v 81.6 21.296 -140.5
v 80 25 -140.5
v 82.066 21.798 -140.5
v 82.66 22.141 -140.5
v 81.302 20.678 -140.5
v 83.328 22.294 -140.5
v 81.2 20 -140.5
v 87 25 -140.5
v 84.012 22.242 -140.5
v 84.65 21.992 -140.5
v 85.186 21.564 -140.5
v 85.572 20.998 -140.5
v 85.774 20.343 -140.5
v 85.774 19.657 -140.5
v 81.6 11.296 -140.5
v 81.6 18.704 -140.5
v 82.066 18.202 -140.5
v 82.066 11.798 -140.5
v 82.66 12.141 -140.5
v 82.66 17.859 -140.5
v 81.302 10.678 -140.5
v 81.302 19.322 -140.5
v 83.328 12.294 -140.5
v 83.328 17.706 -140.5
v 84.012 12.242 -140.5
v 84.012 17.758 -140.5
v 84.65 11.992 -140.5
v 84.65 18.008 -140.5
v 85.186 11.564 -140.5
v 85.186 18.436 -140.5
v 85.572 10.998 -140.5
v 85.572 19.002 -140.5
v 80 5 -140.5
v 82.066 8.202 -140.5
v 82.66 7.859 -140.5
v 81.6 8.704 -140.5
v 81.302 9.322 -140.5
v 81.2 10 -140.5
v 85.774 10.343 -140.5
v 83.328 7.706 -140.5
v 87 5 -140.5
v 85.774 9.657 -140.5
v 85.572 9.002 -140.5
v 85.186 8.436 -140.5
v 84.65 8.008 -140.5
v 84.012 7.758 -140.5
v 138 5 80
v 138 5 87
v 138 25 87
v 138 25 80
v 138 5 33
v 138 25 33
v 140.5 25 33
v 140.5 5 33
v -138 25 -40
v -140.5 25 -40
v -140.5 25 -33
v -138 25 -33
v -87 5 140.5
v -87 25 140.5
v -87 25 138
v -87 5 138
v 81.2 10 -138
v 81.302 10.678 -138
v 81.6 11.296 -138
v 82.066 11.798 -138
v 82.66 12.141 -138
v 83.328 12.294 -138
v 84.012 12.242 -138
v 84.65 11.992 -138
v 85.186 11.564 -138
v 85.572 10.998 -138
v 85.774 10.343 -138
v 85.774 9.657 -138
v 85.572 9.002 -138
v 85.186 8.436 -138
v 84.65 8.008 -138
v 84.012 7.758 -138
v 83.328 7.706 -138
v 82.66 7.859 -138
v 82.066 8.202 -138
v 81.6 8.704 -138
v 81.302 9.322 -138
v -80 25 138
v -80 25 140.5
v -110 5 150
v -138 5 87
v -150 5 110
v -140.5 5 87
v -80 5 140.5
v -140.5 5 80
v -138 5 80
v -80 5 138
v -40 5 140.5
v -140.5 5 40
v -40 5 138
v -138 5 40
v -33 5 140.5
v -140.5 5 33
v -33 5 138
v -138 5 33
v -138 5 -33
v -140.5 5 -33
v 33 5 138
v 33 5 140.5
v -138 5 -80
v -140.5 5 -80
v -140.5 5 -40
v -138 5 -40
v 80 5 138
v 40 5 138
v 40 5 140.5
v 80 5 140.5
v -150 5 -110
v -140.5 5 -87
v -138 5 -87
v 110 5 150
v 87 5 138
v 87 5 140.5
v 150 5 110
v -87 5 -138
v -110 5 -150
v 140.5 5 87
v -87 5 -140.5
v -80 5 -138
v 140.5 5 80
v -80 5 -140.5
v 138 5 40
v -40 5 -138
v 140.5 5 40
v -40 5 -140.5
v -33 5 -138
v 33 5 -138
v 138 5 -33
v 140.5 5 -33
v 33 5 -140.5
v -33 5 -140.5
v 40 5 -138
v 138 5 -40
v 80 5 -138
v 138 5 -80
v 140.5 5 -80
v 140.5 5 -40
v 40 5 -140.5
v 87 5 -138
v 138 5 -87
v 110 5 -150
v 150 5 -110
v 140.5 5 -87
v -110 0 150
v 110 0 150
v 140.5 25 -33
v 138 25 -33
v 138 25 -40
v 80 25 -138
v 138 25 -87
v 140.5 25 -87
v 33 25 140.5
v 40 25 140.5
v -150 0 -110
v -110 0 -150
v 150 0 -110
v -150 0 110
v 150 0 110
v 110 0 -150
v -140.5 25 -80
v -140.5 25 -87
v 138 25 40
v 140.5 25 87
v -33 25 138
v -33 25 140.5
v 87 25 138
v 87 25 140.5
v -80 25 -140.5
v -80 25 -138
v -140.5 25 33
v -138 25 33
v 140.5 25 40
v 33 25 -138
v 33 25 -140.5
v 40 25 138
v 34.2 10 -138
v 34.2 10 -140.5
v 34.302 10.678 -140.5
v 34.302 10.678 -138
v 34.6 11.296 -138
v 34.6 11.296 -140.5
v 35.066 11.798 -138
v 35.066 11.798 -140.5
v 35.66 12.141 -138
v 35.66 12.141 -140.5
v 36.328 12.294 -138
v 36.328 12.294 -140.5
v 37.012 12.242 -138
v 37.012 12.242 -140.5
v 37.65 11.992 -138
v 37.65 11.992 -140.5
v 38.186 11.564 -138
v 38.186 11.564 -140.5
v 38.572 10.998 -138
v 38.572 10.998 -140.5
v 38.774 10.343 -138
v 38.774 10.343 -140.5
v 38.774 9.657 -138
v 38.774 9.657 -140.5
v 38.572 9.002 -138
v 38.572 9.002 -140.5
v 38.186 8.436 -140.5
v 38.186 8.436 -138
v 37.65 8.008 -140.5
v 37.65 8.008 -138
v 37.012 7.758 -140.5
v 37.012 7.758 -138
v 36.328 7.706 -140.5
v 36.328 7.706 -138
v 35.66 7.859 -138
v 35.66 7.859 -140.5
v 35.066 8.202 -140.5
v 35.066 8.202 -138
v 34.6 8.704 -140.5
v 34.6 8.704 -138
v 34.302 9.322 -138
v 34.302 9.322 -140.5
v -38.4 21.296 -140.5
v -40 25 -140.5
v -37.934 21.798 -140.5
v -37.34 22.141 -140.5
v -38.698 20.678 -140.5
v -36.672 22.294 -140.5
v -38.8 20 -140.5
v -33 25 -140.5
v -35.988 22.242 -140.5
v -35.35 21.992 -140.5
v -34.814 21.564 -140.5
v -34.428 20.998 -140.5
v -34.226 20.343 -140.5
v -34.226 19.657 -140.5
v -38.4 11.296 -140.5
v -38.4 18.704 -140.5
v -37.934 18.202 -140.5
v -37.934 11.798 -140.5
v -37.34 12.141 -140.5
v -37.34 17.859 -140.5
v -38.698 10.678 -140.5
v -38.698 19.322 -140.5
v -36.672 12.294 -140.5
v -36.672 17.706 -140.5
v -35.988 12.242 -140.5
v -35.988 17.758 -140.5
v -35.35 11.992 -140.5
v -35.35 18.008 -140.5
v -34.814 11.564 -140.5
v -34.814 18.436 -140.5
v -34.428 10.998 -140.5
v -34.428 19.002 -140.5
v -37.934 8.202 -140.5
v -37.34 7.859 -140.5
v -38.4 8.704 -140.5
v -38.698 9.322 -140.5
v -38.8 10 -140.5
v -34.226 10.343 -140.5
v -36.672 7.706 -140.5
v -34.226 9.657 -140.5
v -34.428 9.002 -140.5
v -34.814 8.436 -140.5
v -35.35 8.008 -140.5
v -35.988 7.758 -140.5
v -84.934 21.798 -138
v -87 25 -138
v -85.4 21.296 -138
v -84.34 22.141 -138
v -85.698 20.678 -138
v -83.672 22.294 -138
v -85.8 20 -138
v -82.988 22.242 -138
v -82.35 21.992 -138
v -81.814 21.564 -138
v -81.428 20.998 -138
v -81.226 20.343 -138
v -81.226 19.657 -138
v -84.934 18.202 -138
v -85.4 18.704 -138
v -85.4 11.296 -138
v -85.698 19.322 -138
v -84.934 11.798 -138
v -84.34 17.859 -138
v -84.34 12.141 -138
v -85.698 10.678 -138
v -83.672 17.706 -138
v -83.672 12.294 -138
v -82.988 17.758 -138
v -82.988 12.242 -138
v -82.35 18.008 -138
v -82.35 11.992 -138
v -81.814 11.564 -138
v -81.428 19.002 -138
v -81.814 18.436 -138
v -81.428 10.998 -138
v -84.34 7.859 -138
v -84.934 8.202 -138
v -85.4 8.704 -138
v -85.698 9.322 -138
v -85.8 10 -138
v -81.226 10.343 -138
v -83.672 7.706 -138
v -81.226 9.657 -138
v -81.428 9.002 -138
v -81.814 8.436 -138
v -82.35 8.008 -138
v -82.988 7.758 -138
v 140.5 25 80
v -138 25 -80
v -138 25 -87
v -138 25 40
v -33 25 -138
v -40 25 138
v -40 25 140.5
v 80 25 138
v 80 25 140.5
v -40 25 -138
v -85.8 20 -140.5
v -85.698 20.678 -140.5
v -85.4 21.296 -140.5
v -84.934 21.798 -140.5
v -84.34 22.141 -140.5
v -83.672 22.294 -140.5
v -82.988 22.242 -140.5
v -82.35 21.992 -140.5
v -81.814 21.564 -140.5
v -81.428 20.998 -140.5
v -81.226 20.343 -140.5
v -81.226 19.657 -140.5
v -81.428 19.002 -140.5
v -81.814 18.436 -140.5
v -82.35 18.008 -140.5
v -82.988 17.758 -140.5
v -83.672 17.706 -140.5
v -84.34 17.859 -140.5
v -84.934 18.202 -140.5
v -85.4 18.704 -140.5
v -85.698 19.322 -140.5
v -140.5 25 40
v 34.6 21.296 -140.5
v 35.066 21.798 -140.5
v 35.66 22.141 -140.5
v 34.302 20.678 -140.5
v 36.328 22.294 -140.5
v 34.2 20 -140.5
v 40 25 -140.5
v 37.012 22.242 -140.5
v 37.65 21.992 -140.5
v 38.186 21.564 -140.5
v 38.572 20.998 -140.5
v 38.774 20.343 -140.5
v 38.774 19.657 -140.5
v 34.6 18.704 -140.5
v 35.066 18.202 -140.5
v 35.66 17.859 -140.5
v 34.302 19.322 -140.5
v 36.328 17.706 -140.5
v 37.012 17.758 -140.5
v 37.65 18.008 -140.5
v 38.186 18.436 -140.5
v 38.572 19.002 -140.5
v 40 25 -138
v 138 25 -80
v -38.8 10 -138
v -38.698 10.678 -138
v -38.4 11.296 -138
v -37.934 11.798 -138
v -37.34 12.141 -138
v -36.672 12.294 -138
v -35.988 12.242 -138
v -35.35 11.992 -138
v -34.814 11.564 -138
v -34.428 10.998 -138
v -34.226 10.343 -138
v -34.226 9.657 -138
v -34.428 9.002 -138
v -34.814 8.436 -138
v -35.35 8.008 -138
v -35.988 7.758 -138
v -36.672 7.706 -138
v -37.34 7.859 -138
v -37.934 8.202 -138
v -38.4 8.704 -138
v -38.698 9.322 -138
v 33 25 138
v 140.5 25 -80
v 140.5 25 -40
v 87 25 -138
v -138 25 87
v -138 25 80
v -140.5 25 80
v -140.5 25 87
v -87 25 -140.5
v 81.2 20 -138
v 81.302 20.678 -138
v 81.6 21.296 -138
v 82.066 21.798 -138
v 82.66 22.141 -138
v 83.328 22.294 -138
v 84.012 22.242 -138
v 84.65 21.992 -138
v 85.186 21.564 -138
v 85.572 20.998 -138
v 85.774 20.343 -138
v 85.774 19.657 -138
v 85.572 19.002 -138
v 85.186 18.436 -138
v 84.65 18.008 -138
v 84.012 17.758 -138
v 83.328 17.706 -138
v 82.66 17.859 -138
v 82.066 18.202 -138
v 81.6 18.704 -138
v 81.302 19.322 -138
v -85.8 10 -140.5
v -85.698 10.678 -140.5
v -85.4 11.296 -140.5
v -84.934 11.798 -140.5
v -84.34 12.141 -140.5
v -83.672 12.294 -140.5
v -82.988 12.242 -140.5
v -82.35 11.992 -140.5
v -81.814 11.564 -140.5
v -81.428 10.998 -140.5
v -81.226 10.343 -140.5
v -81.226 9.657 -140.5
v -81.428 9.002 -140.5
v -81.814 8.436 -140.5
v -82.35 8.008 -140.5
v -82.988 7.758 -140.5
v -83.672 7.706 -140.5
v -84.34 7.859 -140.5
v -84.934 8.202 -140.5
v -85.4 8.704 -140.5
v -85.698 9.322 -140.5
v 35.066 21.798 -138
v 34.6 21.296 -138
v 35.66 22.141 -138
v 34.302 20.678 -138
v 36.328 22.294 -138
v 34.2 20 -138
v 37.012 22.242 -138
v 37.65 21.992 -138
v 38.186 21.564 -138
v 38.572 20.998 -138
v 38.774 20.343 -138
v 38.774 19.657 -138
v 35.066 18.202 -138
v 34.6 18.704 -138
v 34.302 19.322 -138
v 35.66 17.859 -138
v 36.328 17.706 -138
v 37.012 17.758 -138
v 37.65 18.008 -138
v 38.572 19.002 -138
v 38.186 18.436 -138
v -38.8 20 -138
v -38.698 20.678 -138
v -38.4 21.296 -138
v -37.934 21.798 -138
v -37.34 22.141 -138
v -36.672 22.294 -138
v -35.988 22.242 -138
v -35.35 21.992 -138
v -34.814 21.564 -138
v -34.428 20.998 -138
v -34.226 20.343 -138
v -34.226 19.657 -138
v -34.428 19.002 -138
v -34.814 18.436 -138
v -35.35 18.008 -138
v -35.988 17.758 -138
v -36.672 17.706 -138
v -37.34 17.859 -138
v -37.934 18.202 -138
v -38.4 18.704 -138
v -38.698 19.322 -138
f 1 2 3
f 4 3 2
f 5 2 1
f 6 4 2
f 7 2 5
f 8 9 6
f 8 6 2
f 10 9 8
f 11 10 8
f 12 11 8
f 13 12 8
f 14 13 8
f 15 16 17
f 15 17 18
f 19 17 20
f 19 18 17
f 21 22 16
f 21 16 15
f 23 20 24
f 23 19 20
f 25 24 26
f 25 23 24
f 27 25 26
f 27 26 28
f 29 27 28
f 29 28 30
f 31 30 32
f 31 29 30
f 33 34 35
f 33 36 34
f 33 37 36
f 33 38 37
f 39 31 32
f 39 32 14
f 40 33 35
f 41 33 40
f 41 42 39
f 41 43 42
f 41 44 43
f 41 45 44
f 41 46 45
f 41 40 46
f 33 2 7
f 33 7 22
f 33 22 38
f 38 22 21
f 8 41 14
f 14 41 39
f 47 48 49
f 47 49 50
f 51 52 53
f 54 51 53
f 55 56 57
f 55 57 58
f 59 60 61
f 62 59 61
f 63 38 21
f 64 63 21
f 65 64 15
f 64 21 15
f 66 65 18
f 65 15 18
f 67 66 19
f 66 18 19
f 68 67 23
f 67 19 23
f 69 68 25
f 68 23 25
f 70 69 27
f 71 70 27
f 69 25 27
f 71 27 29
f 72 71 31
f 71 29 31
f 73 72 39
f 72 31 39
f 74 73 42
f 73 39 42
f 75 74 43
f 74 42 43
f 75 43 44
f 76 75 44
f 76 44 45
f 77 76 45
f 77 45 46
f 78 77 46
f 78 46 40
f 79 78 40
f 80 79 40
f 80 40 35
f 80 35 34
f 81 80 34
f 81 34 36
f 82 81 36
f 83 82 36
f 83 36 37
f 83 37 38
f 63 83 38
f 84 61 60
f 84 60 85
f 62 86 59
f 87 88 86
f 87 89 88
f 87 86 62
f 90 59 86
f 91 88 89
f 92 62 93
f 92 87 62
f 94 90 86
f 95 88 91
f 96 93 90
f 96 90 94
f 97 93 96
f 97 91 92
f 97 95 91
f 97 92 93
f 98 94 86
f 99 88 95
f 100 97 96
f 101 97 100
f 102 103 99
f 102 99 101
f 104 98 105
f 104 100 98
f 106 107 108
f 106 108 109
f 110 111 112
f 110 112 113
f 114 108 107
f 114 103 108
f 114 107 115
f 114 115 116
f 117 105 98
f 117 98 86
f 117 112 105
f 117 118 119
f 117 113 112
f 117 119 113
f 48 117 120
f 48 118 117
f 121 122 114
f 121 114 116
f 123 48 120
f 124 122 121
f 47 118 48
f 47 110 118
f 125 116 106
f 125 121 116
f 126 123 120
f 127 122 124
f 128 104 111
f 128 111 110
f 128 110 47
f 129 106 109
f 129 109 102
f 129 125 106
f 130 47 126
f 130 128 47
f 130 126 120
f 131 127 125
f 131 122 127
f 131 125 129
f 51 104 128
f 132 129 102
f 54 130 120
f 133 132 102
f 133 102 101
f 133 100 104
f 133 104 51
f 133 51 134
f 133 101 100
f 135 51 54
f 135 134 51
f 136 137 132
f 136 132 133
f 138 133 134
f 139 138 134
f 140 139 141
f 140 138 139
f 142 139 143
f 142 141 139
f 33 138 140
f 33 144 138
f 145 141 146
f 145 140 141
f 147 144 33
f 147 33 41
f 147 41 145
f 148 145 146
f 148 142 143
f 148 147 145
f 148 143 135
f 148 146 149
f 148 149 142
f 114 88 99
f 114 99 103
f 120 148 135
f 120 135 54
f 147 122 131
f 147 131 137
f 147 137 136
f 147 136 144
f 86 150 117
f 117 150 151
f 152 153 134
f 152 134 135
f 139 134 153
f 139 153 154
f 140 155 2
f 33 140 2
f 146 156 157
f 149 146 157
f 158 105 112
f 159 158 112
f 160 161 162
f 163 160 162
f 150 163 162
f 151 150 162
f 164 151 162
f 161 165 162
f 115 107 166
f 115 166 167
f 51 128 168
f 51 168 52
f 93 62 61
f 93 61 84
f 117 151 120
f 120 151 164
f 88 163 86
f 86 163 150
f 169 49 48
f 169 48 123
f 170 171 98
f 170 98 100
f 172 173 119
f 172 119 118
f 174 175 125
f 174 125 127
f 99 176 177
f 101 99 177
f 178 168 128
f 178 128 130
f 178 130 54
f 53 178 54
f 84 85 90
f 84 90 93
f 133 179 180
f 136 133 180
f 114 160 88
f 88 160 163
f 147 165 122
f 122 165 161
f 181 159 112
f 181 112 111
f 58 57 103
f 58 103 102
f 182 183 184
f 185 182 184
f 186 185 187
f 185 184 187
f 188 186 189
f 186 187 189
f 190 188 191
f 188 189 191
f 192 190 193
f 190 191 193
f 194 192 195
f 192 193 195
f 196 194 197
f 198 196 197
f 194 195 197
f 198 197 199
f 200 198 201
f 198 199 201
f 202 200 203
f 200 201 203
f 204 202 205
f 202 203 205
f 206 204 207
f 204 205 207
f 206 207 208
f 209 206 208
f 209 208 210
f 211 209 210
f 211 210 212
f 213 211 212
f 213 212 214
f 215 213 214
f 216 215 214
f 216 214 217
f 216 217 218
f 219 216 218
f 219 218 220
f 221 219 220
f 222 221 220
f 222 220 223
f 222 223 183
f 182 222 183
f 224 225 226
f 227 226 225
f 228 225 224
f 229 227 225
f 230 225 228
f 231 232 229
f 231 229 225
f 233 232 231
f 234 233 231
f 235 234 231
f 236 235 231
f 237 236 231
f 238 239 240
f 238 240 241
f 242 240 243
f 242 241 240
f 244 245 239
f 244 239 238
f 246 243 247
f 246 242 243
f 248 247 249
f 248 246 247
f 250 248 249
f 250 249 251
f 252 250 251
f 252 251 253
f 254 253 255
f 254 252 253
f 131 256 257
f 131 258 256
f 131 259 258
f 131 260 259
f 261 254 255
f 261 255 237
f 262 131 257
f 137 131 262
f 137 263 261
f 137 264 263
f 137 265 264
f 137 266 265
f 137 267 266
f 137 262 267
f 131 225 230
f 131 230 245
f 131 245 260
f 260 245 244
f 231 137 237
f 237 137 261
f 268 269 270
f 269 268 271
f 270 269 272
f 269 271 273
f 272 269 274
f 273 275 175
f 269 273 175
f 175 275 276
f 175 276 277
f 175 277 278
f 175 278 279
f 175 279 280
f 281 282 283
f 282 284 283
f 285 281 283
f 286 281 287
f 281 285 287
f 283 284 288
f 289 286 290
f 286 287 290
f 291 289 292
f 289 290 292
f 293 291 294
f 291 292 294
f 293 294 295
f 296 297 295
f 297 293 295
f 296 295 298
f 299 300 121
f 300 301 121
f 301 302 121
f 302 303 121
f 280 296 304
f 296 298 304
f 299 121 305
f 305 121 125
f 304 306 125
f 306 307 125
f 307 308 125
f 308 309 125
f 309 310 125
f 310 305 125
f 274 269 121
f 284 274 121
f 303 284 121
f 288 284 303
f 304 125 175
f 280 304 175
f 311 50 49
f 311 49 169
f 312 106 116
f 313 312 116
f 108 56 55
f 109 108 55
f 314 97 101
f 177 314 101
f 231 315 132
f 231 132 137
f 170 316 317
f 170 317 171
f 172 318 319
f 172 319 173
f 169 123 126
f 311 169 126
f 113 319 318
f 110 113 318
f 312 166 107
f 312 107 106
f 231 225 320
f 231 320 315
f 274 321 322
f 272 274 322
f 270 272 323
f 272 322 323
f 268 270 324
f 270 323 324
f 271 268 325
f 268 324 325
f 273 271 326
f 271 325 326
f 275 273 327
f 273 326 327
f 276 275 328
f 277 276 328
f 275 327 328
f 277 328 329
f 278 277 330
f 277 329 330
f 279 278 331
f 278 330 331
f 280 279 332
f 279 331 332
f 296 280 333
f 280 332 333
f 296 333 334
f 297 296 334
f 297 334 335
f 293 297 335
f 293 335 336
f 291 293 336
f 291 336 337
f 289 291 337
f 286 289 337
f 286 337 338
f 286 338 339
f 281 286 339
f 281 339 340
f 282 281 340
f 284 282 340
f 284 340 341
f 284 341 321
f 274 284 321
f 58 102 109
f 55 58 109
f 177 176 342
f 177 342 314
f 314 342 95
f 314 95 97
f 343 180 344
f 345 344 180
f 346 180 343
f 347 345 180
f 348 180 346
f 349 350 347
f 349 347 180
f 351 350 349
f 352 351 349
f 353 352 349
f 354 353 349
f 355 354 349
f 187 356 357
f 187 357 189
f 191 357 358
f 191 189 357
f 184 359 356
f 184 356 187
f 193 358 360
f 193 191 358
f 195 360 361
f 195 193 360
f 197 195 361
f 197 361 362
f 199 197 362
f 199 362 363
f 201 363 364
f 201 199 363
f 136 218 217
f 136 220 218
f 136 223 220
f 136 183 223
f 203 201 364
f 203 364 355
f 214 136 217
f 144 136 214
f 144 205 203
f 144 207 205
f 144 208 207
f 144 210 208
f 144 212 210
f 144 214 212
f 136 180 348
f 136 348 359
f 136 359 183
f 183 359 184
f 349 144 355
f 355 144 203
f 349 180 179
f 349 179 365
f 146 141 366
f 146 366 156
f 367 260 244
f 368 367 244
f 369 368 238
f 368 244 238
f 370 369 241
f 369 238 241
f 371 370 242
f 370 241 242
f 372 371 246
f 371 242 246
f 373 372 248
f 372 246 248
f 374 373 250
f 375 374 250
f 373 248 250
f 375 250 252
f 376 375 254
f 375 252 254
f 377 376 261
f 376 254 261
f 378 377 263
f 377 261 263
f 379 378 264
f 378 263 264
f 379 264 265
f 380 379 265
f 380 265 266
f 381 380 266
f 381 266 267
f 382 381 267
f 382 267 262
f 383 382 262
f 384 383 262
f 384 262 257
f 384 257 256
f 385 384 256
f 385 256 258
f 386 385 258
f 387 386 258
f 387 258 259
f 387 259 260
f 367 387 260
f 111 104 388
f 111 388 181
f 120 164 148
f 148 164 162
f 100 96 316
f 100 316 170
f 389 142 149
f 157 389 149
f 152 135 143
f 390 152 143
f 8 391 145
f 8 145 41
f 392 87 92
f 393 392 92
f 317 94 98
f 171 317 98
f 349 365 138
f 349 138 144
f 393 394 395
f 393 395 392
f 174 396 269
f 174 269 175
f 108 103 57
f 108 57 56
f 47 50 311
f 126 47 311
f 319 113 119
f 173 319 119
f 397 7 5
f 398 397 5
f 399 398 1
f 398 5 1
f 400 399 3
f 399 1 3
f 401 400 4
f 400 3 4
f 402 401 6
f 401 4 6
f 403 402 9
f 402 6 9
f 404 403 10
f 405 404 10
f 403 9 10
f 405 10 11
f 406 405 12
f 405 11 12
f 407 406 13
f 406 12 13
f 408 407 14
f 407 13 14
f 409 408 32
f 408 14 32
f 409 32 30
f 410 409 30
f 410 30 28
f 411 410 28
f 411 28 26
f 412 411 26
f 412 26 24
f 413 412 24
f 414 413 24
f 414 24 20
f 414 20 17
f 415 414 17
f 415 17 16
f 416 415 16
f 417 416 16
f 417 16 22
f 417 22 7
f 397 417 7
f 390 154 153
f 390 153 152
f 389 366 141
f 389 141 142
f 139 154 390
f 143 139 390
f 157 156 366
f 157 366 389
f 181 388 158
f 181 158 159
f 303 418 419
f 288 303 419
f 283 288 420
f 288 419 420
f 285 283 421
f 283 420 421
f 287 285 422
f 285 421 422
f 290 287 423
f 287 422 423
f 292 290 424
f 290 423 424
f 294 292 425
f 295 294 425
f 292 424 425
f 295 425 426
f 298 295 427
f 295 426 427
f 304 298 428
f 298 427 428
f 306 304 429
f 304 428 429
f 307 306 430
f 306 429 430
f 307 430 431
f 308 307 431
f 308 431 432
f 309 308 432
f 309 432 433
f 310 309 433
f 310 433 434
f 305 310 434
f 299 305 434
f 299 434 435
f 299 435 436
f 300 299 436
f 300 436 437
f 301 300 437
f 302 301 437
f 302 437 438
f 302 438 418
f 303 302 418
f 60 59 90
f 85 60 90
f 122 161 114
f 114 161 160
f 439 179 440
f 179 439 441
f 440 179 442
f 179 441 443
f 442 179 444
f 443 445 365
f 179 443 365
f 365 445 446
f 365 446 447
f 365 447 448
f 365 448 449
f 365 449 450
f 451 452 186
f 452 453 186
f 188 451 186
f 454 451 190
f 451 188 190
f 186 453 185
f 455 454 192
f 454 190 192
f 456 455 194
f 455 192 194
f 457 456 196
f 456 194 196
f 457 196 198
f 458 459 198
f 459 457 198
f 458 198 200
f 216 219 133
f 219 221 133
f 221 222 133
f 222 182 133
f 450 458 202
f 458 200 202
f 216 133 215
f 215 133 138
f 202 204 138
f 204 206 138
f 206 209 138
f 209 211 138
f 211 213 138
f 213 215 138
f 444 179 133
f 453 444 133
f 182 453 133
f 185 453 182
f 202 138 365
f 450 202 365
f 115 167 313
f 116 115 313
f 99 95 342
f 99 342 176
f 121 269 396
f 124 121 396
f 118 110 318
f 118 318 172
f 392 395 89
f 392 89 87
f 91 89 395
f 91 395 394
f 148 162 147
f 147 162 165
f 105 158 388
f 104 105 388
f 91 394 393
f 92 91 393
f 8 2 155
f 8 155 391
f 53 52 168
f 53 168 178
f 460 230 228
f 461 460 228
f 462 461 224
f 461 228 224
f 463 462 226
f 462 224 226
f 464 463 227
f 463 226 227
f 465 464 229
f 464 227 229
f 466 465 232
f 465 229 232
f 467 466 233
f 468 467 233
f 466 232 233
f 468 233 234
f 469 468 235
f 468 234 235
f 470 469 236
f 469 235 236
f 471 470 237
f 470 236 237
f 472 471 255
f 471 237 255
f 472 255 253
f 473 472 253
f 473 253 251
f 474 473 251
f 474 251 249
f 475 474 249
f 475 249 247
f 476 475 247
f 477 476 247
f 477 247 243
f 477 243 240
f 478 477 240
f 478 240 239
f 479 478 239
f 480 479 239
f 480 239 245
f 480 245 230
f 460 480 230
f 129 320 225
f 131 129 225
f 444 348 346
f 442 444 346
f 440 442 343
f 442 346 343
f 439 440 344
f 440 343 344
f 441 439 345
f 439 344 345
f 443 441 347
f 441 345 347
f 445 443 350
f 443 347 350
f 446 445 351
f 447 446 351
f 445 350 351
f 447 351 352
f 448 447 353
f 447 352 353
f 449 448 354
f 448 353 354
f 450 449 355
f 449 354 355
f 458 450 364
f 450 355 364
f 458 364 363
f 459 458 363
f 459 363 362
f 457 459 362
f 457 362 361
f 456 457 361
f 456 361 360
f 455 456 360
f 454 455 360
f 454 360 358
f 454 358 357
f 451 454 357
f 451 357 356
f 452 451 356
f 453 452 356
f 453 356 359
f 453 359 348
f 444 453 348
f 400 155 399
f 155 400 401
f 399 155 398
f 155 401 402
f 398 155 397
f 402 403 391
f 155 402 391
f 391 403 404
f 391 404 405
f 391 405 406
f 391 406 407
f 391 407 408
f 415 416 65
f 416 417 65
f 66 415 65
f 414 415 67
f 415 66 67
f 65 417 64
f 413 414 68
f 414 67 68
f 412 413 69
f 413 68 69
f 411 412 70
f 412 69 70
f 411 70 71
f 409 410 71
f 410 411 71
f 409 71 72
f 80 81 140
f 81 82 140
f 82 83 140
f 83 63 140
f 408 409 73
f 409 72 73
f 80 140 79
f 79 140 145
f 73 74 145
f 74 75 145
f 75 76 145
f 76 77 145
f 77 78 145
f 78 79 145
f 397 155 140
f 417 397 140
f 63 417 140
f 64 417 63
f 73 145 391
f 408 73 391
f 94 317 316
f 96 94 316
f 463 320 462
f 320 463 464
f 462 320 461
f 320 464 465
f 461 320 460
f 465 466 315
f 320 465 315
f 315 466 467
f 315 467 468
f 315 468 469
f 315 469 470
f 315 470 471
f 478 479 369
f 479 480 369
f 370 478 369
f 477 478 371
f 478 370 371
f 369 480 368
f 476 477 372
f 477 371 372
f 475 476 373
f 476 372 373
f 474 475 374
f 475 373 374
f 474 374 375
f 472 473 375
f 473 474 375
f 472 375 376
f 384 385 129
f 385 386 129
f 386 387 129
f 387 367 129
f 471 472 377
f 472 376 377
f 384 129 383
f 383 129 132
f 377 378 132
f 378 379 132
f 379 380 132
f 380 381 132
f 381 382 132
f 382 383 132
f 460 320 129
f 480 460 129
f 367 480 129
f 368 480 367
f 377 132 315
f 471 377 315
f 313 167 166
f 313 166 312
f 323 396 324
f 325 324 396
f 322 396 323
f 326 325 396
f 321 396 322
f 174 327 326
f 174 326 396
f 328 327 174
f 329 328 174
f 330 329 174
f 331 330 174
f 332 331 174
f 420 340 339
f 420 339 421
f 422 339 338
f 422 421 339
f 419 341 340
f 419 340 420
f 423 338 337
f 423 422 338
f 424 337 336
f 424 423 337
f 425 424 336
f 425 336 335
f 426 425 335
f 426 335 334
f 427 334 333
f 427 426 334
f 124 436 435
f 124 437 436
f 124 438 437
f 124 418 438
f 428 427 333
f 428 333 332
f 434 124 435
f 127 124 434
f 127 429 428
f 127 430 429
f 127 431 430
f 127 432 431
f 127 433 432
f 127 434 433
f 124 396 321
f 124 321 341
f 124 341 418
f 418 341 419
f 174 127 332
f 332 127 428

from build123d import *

# Parameters (mm, degrees)
EXTRUDE_1_DEPTH     = 5
SKETCH_1_5_W        = 7
SKETCH_1_5_H        = 2.5
SKETCH_1_5_W_2      = 2.5
SKETCH_1_5_H_2      = 7
EXTRUDE_2_DEPTH     = 25
SKETCH_15_R         = 2.3
CUT_EXTRUDE_1_DEPTH = 20


with BuildPart() as part:
    # 草图1 → 凸台-拉伸1 (new body)
    with BuildSketch(Plane(origin=(0, 0, 0), x_dir=(1, 0, 0), z_dir=(0, 1, 0))):
        Polygon((-110, 150), (-150, 110), (-150, -110), (-110, -150), (110, -150), (150, -110), (150, 110), (110, 150), align=None)
    extrude(amount=EXTRUDE_1_DEPTH)

    # 草图1<5> → 凸台-拉伸2 (add)
    with BuildSketch(Plane(origin=(0, 0, 0), x_dir=(1, 0, 0), z_dir=(0, 1, 0))):
        with Locations((-36.5, -139.25)):
            Rectangle(SKETCH_1_5_W, SKETCH_1_5_H)
        with Locations((36.5, -139.25)):
            Rectangle(SKETCH_1_5_W, SKETCH_1_5_H)
        with Locations((139.25, 36.5)):
            Rectangle(SKETCH_1_5_W_2, SKETCH_1_5_H_2)
        with Locations((83.5, 139.25)):
            Rectangle(SKETCH_1_5_W, SKETCH_1_5_H)
        with Locations((-83.5, -139.25)):
            Rectangle(SKETCH_1_5_W, SKETCH_1_5_H)
        with Locations((83.5, -139.25)):
            Rectangle(SKETCH_1_5_W, SKETCH_1_5_H)
        with Locations((139.25, -83.5)):
            Rectangle(SKETCH_1_5_W_2, SKETCH_1_5_H_2)
        with Locations((139.25, -36.5)):
            Rectangle(SKETCH_1_5_W_2, SKETCH_1_5_H_2)
        with Locations((139.25, 83.5)):
            Rectangle(SKETCH_1_5_W_2, SKETCH_1_5_H_2)
        with Locations((36.5, 139.25)):
            Rectangle(SKETCH_1_5_W, SKETCH_1_5_H)
        with Locations((-139.25, 83.5)):
            Rectangle(SKETCH_1_5_W_2, SKETCH_1_5_H_2)
        with Locations((-139.25, 36.5)):
            Rectangle(SKETCH_1_5_W_2, SKETCH_1_5_H_2)
        with Locations((-83.5, 139.25)):
            Rectangle(SKETCH_1_5_W, SKETCH_1_5_H)
        with Locations((-36.5, 139.25)):
            Rectangle(SKETCH_1_5_W, SKETCH_1_5_H)
        with Locations((-139.25, -36.5)):
            Rectangle(SKETCH_1_5_W_2, SKETCH_1_5_H_2)
        with Locations((-139.25, -83.5)):
            Rectangle(SKETCH_1_5_W_2, SKETCH_1_5_H_2)
    extrude(amount=EXTRUDE_2_DEPTH)

    # 草图15 → 切除-拉伸1 (cut)
    with BuildSketch(Plane(origin=(0, 0, -140.5), x_dir=(-1, 0, 0), z_dir=(0, 0, -1))):
        with Locations((-83.5, 20)):
            Circle(SKETCH_15_R)
        with Locations((-83.5, 10)):
            Circle(SKETCH_15_R)
        with Locations((-36.5, 20)):
            Circle(SKETCH_15_R)
        with Locations((-36.5, 10)):
            Circle(SKETCH_15_R)
        with Locations((36.5, 10)):
            Circle(SKETCH_15_R)
        with Locations((36.5, 20)):
            Circle(SKETCH_15_R)
        with Locations((83.5, 20)):
            Circle(SKETCH_15_R)
        with Locations((83.5, 10)):
            Circle(SKETCH_15_R)
    extrude(amount=-CUT_EXTRUDE_1_DEPTH, mode=Mode.SUBTRACT)


solid = part.part
